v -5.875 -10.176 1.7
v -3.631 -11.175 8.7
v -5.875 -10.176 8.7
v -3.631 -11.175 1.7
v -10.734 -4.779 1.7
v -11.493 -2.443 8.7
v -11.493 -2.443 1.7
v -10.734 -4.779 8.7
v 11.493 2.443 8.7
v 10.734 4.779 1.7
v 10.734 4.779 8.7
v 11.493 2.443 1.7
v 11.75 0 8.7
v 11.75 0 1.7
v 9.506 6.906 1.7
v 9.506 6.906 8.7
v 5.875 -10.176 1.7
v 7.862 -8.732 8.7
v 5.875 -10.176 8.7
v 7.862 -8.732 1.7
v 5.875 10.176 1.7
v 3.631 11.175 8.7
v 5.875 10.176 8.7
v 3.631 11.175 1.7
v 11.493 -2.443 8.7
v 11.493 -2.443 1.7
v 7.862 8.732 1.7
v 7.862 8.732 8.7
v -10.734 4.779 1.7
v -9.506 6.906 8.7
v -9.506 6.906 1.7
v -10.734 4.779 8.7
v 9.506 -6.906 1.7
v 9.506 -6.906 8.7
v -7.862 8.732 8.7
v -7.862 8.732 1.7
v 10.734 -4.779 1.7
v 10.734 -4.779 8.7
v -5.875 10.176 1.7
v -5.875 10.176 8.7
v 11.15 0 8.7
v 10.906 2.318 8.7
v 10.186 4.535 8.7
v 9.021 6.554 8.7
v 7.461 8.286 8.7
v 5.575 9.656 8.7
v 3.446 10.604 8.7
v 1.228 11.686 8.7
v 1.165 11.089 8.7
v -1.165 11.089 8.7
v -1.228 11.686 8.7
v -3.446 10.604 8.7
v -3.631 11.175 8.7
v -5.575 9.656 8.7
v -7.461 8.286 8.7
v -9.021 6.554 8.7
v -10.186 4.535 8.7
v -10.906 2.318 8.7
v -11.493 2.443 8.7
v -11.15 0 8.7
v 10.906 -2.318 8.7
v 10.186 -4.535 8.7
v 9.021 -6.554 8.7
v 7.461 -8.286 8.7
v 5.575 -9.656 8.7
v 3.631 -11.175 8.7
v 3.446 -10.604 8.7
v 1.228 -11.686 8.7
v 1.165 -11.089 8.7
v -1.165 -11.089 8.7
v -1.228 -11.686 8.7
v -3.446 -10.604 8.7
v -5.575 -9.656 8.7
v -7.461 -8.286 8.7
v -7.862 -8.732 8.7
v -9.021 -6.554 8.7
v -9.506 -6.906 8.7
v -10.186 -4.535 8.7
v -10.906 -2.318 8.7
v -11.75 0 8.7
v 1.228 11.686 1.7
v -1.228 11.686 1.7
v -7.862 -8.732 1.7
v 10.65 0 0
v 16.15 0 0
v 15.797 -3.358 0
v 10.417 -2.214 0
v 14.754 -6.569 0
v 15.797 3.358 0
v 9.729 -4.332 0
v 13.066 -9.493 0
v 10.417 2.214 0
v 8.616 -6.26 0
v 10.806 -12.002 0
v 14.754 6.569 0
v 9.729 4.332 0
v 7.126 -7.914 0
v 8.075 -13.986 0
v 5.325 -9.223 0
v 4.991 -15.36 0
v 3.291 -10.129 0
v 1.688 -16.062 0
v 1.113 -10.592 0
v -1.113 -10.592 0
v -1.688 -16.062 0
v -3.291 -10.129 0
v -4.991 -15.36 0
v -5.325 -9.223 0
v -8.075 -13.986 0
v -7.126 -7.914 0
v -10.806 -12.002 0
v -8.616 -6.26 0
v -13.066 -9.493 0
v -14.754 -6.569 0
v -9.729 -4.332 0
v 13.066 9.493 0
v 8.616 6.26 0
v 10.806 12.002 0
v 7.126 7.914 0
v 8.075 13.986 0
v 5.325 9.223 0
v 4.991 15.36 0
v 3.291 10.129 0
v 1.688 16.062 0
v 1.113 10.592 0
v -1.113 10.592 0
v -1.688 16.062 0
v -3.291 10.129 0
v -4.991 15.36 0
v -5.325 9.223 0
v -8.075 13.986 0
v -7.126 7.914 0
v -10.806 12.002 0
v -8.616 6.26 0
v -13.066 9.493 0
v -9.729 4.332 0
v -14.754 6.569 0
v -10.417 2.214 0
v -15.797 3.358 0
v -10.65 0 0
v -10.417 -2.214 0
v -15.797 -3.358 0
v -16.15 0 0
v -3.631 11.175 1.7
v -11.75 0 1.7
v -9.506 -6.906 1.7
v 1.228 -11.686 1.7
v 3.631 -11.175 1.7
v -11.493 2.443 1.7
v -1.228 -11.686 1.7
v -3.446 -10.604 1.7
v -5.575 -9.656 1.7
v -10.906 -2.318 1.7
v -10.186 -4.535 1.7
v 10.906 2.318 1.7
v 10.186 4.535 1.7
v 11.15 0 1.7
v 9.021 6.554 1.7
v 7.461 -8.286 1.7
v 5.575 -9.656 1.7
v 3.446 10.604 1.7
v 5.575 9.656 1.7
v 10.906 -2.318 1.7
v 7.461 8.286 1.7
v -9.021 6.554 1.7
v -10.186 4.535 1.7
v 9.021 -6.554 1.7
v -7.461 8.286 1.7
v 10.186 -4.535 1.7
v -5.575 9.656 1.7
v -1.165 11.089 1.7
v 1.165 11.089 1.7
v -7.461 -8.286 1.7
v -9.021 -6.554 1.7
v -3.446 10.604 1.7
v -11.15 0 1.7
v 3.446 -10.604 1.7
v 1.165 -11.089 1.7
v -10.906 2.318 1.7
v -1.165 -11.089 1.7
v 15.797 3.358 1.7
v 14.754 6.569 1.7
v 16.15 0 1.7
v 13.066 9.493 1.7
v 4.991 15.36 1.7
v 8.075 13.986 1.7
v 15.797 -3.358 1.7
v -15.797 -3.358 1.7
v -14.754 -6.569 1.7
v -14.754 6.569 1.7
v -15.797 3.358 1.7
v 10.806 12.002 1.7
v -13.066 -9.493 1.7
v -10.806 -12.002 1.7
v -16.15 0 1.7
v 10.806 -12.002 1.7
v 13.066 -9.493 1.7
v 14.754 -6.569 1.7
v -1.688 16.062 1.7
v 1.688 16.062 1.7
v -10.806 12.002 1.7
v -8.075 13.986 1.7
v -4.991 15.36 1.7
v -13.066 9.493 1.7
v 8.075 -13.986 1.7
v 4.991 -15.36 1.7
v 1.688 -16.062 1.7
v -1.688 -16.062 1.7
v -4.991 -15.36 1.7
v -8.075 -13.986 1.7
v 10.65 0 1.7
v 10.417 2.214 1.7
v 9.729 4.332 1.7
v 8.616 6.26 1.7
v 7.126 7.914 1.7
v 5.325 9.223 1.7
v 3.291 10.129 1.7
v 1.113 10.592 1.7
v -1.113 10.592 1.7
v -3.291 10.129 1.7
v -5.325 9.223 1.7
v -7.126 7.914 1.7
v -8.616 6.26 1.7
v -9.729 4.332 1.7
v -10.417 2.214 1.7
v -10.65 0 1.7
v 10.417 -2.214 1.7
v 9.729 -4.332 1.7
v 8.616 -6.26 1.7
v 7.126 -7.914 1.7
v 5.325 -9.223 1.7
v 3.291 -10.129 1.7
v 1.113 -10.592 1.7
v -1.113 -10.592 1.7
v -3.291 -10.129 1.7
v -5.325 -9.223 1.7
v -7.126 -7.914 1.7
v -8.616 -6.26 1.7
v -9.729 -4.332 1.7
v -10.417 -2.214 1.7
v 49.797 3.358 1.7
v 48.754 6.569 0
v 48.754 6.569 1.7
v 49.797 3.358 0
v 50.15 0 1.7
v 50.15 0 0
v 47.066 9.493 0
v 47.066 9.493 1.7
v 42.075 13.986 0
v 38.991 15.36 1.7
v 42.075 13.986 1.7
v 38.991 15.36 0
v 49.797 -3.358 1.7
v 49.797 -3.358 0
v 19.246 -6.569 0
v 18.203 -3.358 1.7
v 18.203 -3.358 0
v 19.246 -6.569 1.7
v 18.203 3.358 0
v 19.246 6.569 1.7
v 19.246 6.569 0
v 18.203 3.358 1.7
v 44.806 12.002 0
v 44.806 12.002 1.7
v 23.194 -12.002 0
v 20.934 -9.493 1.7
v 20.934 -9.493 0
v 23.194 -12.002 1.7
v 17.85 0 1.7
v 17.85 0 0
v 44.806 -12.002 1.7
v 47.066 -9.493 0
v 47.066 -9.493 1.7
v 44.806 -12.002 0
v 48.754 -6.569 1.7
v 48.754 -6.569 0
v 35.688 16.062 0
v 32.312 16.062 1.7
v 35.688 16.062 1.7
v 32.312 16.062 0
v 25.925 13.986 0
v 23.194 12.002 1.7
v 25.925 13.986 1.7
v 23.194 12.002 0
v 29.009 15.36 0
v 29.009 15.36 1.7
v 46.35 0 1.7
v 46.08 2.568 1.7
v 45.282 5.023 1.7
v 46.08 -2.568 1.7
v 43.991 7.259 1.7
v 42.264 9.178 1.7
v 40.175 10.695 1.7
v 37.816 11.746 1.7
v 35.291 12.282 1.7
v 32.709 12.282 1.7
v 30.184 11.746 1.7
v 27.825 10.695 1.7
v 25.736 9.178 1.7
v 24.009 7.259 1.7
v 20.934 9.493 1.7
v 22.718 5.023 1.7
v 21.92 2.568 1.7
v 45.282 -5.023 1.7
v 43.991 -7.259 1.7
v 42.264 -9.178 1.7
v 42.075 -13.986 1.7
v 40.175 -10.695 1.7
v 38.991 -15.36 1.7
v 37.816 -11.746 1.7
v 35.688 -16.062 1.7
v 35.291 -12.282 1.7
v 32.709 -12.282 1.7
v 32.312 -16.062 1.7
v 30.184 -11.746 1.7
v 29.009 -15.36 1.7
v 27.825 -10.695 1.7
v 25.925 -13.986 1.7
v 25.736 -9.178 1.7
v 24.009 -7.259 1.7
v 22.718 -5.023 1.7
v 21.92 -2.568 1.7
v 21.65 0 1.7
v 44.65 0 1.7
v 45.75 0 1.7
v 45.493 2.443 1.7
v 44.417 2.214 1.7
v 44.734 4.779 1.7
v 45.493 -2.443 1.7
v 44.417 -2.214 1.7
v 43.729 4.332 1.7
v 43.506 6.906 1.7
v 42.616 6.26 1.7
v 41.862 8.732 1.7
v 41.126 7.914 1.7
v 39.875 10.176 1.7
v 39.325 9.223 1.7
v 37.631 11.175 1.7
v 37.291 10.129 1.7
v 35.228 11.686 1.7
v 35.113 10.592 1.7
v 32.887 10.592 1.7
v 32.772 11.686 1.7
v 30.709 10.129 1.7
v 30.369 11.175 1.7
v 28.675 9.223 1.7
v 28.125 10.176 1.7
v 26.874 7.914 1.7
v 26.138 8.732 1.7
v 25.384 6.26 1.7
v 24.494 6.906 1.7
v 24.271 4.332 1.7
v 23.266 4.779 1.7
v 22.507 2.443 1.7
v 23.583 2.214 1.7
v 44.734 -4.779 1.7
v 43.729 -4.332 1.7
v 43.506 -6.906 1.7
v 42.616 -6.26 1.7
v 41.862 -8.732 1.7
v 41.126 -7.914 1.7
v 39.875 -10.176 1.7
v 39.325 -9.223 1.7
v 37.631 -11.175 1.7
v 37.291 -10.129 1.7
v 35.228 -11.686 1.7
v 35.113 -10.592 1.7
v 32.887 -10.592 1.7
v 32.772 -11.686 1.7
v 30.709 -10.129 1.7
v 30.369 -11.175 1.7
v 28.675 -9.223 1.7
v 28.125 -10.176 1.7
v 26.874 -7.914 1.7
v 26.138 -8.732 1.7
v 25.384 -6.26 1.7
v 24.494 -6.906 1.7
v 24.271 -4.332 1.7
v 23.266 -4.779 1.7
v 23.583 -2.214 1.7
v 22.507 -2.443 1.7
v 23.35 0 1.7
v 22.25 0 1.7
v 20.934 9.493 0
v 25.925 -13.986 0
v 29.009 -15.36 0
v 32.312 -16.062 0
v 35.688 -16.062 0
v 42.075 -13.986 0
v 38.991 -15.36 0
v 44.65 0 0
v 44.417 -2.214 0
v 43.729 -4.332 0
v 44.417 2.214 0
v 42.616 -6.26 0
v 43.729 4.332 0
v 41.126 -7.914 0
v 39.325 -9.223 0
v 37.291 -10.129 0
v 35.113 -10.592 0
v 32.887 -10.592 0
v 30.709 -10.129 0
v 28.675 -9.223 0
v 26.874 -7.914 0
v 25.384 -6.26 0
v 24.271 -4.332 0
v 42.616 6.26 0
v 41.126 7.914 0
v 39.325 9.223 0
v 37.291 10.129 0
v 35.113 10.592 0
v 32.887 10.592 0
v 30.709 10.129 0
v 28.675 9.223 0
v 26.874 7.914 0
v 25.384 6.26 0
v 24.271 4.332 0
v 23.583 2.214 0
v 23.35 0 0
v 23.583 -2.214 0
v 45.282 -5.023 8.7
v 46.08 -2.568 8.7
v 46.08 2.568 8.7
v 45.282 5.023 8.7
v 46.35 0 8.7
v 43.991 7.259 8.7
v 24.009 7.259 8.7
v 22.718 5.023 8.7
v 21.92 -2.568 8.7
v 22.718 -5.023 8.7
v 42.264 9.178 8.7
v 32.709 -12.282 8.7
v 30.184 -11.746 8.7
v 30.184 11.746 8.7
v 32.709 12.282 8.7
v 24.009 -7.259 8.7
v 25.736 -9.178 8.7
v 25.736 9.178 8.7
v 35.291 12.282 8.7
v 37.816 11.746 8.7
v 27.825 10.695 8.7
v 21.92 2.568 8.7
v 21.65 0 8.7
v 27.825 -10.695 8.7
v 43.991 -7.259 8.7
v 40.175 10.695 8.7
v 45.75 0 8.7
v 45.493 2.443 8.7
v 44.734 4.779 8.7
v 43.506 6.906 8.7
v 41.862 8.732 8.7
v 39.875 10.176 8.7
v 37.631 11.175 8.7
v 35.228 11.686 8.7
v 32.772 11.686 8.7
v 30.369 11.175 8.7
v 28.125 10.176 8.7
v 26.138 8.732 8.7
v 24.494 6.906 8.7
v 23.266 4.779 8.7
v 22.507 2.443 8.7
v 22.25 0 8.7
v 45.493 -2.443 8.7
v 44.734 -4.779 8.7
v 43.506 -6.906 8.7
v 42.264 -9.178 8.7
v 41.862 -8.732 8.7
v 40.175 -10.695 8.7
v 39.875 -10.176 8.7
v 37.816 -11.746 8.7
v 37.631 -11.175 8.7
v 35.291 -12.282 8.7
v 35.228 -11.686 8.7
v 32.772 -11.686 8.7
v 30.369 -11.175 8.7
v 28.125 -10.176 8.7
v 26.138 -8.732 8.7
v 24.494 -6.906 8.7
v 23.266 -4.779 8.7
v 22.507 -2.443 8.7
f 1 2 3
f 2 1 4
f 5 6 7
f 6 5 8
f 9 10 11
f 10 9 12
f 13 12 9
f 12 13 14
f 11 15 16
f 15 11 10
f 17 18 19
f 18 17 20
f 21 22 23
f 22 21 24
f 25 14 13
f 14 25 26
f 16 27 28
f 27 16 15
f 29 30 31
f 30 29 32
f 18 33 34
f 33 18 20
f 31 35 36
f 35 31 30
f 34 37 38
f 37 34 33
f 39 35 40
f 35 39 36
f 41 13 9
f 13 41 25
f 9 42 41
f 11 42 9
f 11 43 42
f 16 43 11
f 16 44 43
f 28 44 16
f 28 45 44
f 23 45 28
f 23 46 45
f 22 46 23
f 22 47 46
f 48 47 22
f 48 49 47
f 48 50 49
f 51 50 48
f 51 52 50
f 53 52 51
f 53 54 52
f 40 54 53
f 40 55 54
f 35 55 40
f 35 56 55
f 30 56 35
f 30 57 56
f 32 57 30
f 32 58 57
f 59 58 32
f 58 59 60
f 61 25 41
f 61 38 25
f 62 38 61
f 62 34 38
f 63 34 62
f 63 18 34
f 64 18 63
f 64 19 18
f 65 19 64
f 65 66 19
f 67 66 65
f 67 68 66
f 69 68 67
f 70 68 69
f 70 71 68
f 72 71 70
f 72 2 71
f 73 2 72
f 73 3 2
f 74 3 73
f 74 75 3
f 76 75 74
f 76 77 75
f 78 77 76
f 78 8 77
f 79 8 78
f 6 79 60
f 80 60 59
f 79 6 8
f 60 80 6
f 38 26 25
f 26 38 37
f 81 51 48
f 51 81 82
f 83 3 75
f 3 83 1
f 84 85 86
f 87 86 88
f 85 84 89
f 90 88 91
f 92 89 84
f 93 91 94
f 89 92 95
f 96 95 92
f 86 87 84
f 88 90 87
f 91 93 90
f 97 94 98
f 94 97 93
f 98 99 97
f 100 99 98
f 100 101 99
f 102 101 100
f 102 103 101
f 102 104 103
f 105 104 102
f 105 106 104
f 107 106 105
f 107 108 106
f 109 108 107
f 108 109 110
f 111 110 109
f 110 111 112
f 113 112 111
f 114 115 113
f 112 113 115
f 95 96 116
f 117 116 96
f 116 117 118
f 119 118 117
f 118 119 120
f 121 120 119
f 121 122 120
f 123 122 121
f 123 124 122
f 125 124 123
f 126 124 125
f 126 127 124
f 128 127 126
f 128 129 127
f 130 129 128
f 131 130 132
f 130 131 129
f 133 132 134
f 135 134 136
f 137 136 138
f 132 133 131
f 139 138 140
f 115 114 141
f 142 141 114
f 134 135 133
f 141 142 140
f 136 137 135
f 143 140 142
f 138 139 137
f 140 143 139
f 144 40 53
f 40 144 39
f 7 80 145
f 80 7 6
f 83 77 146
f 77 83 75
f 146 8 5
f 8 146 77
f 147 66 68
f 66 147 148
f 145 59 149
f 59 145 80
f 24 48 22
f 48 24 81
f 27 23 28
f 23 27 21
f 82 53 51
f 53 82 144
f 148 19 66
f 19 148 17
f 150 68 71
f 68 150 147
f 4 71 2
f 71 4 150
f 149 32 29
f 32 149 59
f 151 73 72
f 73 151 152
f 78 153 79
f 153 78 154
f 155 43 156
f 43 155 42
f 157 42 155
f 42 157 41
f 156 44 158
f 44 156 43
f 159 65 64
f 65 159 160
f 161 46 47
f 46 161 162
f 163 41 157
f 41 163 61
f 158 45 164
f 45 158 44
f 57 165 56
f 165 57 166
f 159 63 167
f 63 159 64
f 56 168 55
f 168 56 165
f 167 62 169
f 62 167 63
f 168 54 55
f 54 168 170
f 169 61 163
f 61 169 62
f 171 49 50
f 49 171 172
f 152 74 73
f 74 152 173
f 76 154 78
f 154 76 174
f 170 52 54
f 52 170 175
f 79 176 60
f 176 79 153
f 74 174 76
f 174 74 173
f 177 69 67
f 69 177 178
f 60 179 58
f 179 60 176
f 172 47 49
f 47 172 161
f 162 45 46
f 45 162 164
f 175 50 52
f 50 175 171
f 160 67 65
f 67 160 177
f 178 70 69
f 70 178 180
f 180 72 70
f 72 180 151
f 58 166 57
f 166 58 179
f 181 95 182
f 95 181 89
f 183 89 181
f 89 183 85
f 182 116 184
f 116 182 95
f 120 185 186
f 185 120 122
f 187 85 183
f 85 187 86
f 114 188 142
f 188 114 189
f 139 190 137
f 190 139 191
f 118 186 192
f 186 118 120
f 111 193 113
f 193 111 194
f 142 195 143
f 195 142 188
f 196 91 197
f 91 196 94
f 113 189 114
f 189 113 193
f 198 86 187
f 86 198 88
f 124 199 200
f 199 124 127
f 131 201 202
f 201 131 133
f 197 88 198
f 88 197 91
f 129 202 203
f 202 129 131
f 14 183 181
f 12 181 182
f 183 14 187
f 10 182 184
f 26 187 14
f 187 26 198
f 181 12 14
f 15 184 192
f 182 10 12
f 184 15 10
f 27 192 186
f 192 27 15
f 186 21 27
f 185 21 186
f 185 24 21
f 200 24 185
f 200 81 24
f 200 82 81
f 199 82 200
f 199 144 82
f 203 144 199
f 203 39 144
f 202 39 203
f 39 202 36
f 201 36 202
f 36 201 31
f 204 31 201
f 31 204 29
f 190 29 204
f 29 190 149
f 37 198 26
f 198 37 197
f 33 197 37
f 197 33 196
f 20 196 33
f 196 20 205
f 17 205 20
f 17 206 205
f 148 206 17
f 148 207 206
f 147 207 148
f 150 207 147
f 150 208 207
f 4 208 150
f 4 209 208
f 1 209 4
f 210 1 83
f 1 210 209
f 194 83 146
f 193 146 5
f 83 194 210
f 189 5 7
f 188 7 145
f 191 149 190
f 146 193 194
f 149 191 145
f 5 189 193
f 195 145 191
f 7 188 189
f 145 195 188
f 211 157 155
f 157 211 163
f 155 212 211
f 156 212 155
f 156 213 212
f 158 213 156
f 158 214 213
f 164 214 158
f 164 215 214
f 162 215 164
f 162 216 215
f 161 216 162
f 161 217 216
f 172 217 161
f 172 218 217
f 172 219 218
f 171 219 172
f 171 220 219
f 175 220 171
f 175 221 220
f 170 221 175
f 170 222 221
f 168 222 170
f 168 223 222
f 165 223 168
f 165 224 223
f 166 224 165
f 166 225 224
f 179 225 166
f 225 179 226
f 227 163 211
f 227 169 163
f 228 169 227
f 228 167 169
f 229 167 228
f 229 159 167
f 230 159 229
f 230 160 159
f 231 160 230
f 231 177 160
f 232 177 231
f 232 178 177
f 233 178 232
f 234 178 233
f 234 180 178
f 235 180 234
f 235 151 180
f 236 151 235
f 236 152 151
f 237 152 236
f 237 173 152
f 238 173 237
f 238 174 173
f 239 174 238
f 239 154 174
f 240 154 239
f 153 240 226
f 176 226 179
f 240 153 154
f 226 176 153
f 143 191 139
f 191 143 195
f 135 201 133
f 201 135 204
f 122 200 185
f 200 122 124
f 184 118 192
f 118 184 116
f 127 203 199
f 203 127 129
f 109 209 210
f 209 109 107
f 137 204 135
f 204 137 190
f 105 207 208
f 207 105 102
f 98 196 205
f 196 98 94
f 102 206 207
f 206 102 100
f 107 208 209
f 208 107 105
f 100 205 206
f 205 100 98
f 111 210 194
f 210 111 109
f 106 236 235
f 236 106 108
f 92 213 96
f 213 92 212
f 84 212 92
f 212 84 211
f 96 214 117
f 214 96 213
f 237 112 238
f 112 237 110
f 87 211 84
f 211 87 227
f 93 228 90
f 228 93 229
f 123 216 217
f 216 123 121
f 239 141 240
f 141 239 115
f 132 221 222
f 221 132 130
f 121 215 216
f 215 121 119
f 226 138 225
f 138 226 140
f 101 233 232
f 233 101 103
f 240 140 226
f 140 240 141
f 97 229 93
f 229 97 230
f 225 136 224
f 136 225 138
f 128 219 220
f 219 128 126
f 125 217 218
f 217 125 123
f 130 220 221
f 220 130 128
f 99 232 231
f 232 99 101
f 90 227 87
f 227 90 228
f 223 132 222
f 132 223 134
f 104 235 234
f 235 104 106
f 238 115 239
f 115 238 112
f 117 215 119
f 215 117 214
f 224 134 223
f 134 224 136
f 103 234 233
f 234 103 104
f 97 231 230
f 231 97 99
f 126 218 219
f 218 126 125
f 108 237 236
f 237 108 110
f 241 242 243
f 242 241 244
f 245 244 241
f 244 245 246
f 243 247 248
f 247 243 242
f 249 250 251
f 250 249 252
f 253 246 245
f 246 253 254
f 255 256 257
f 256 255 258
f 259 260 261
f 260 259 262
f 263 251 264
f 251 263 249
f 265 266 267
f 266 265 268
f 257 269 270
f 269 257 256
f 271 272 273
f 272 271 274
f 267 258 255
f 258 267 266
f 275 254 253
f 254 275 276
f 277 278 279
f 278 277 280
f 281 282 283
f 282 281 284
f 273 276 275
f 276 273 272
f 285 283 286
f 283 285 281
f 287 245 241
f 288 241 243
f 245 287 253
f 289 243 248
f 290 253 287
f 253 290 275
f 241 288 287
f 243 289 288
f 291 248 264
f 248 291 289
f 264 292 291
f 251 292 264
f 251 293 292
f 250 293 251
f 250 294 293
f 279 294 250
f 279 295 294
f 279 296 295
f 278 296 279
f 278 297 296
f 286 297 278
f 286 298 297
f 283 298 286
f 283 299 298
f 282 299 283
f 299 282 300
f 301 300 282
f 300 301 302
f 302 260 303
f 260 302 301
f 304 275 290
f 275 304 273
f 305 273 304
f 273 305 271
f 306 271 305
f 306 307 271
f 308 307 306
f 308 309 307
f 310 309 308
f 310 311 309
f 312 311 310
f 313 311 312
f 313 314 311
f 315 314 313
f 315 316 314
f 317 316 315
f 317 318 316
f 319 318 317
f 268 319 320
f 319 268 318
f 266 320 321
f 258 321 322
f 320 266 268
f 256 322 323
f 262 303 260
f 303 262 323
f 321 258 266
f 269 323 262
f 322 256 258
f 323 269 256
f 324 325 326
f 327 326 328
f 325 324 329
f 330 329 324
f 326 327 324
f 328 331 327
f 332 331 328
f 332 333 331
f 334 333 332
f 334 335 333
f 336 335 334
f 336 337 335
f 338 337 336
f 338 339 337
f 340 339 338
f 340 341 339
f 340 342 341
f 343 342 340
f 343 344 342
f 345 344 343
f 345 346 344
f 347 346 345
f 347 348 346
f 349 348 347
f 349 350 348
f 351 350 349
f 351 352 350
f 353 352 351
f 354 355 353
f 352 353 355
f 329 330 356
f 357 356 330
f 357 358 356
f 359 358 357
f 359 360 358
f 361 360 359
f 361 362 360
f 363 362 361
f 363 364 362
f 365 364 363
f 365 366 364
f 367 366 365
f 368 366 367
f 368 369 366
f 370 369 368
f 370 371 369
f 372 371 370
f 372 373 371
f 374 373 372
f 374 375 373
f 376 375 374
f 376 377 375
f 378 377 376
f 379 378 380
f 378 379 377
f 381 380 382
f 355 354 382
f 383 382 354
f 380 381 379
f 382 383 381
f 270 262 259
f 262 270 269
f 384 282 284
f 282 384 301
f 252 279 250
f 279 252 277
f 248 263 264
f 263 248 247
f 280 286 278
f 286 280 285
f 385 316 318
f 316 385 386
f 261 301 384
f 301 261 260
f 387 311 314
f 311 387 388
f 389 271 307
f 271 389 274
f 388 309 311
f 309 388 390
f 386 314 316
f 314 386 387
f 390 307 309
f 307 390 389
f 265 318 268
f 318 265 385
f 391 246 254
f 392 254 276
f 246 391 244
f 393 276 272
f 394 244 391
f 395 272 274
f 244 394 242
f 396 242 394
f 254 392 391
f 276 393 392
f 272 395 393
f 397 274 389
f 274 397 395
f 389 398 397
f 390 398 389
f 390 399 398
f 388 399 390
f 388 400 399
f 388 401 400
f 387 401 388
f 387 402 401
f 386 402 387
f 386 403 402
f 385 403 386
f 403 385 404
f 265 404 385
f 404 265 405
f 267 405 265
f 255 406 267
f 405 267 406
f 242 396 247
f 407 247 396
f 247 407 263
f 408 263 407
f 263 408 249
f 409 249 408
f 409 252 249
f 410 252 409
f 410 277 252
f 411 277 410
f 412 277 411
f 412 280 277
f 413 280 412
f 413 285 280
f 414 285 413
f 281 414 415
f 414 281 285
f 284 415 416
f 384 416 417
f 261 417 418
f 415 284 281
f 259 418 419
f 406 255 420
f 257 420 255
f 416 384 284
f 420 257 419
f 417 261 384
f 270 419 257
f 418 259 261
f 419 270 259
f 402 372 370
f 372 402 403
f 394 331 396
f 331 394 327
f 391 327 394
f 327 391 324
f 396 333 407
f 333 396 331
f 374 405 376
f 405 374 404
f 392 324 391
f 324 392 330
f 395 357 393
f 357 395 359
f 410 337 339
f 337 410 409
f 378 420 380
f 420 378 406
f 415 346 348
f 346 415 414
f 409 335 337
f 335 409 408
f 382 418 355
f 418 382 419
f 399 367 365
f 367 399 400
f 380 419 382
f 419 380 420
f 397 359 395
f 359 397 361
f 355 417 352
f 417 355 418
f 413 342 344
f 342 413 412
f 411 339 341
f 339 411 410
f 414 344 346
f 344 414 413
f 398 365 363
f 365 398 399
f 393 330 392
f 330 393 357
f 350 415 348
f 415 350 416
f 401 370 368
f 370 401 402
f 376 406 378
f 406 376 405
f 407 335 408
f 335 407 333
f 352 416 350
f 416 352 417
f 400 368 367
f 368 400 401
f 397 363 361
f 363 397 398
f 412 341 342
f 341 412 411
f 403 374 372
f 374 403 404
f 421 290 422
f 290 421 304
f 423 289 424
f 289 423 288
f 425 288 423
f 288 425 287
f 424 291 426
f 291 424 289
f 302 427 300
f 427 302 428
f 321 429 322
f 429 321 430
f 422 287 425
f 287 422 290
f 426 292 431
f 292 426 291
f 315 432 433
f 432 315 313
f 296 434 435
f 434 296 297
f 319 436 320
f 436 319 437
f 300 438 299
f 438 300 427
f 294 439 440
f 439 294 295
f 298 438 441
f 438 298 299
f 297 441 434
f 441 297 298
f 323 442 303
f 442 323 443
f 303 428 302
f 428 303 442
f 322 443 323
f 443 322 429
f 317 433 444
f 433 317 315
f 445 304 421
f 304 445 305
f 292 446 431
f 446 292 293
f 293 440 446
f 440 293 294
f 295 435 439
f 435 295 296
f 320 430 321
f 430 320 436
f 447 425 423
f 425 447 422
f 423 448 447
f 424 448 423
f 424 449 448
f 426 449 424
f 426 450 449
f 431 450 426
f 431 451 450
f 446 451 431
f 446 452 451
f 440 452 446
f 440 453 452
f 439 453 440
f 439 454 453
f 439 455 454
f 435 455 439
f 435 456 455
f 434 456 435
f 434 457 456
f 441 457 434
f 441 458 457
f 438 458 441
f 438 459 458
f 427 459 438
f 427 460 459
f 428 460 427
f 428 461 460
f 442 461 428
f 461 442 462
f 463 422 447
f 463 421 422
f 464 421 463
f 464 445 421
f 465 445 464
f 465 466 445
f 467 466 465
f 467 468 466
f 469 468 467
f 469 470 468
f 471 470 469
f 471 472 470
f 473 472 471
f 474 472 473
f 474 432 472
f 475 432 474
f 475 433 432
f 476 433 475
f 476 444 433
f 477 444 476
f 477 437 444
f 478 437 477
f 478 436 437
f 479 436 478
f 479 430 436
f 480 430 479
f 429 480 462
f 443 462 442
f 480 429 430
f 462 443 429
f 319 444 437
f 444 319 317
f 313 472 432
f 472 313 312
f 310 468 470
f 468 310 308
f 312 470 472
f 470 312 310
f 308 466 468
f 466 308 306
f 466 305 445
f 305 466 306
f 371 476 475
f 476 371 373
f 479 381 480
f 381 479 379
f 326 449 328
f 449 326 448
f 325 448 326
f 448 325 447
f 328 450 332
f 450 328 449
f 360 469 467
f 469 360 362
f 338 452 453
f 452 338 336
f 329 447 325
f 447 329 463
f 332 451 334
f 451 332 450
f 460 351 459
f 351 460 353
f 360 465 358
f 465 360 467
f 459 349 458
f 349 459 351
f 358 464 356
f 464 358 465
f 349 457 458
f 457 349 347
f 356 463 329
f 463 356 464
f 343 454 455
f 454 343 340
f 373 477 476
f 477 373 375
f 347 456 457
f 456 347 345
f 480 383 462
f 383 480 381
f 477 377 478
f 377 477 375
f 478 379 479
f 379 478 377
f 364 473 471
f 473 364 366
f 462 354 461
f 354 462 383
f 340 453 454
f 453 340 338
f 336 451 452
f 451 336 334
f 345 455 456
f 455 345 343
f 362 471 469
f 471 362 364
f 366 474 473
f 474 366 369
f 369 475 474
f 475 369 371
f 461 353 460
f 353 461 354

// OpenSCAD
//PRUSAMendel
//GNUGPLv2
//GregFrost

/**
*@categoryPrinted
*/

single_layer_width=0.6;
bearing_inner=22.3;
thickness=1.7;
height=7+thickness;
wall_ascent=5;
wall_descent=0.5;

module inner()
{
	difference()
	{
		cylinder(r=bearing_inner/2+single_layer_width,h=height);
		translate([0,0,-1])
		cylinder(r=bearing_inner/2,h=height+2);
	}

	difference()
	{
		cylinder(r=bearing_inner/2+wall_ascent,h=thickness);
		translate([0,0,-1])
		cylinder(r=bearing_inner/2-wall_descent,h=thickness+2);
	}
}

module outer()
{
	difference()
	{
		cylinder(r=bearing_inner/2+2*single_layer_width,h=height);
		translate([0,0,-1])
		cylinder(r=bearing_inner/2+single_layer_width,h=height+2);
	}

	difference()
	{
		cylinder(r=bearing_inner/2+wall_ascent,h=thickness);
		translate([0,0,-1])
		cylinder(r=bearing_inner/2-wall_descent,h=thickness+2);
	}
}

inner();

translate([34,0,0])
outer();
